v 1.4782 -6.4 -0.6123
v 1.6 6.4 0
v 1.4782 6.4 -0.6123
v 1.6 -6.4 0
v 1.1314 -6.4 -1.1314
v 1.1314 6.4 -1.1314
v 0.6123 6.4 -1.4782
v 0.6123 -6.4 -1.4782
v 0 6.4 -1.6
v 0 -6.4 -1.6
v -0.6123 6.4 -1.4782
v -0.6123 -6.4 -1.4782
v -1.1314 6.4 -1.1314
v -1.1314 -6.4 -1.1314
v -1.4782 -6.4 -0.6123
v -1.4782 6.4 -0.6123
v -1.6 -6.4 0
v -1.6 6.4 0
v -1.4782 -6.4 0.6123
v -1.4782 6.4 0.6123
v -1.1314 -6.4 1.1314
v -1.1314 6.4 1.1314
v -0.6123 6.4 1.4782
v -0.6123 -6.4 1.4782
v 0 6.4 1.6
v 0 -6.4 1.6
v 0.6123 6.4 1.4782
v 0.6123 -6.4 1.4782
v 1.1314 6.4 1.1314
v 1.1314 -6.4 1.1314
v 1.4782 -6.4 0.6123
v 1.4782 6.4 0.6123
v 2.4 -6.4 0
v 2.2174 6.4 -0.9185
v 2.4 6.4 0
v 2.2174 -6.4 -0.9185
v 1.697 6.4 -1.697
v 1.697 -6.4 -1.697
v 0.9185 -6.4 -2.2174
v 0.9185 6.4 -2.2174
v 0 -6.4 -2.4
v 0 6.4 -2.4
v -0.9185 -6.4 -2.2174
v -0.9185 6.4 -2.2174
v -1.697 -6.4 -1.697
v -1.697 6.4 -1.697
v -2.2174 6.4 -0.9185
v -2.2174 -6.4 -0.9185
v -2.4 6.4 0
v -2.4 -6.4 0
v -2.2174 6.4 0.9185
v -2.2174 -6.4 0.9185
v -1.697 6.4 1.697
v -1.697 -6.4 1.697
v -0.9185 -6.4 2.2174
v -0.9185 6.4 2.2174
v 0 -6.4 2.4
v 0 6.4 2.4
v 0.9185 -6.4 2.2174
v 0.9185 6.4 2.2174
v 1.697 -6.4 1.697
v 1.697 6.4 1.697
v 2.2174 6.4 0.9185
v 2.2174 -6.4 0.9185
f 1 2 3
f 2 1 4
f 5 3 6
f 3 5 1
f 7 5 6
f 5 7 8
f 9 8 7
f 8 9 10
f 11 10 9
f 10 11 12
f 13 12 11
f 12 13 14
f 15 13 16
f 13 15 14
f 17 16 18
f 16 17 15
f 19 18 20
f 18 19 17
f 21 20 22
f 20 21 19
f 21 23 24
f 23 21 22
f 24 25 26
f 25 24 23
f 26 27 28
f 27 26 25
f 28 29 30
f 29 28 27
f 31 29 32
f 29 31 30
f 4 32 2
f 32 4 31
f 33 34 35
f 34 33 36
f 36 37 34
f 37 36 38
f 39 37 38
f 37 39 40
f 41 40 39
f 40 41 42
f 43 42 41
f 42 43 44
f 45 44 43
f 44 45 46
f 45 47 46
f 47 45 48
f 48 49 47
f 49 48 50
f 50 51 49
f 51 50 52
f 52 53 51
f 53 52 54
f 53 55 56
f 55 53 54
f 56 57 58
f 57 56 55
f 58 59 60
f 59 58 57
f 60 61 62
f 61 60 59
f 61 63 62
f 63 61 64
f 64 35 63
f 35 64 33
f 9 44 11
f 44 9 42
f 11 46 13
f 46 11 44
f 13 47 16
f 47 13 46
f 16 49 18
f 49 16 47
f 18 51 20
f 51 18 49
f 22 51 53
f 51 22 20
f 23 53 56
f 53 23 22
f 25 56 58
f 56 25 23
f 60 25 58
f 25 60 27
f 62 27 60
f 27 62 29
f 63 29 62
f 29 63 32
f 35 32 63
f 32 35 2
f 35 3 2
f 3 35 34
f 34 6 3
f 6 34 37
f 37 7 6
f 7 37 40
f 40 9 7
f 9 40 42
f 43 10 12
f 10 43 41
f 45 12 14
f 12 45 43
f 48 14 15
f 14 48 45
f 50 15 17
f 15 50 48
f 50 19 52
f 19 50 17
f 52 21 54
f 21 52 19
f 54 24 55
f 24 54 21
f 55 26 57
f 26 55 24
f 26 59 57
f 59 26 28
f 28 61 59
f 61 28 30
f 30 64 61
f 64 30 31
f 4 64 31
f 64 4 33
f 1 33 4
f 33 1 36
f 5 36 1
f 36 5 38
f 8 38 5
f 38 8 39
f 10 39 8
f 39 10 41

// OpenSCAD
// file: ../p/4-4disc.scad
use <../lib.scad>
$fa=1; $fs=0.2;
function ldraw_lib__4_4disc(realsolid=false) = [
// 0 Disc 1.0
// 0 Name: 4-4disc.dat
// 0 Author: James Jessiman
// 0 !LDRAW_ORG Primitive UPDATE 2002-02
// 0 !LICENSE Licensed under CC BY 2.0 and CC BY 4.0 : see CAreadme.txt
// 
// 0 BFC CERTIFY CCW
  [0,"BFC","CERTIFY"],
  [0,"BFC","CCW"],
// 
// 0 !HISTORY 1998-12-15 [PTadmin] Official Update 1998-10
// 0 !HISTORY 2002-03-23 [sbliss] Added BFC statement
// 0 !HISTORY 2002-04-25 [PTadmin] Official Update 2002-02
// 0 !HISTORY 2007-06-24 [PTadmin] Header formatted for Contributor Agreement
// 0 !HISTORY 2008-07-01 [PTadmin] Official Update 2008-01
// 
// 
// 3 16 0 0 0 1 0 0 0.9239 0 0.3827
  [3,16,0,0,0,1,0,0,0.9239,0,0.3827],
// 3 16 0 0 0 0.9239 0 0.3827 0.7071 0 0.7071
  [3,16,0,0,0,0.9239,0,0.3827,0.7071,0,0.7071],
// 3 16 0 0 0 0.7071 0 0.7071 0.3827 0 0.9239
  [3,16,0,0,0,0.7071,0,0.7071,0.3827,0,0.9239],
// 3 16 0 0 0 0.3827 0 0.9239 0 0 1
  [3,16,0,0,0,0.3827,0,0.9239,0,0,1],
// 3 16 0 0 0 0 0 1 -0.3827 0 0.9239
  [3,16,0,0,0,0,0,1,-0.3827,0,0.9239],
// 3 16 0 0 0 -0.3827 0 0.9239 -0.7071 0 0.7071
  [3,16,0,0,0,-0.3827,0,0.9239,-0.7071,0,0.7071],
// 3 16 0 0 0 -0.7071 0 0.7071 -0.9239 0 0.3827
  [3,16,0,0,0,-0.7071,0,0.7071,-0.9239,0,0.3827],
// 3 16 0 0 0 -0.9239 0 0.3827 -1 0 -0
  [3,16,0,0,0,-0.9239,0,0.3827,-1,0,-0],
// 3 16 0 0 0 -1 0 -0 -0.9239 0 -0.3827
  [3,16,0,0,0,-1,0,-0,-0.9239,0,-0.3827],
// 3 16 0 0 0 -0.9239 0 -0.3827 -0.7071 0 -0.7071
  [3,16,0,0,0,-0.9239,0,-0.3827,-0.7071,0,-0.7071],
// 3 16 0 0 0 -0.7071 0 -0.7071 -0.3827 0 -0.9239
  [3,16,0,0,0,-0.7071,0,-0.7071,-0.3827,0,-0.9239],
// 3 16 0 0 0 -0.3827 0 -0.9239 0 0 -1
  [3,16,0,0,0,-0.3827,0,-0.9239,0,0,-1],
// 3 16 0 0 0 0 0 -1 0.3827 0 -0.9239
  [3,16,0,0,0,0,0,-1,0.3827,0,-0.9239],
// 3 16 0 0 0 0.3827 0 -0.9239 0.7071 0 -0.7071
  [3,16,0,0,0,0.3827,0,-0.9239,0.7071,0,-0.7071],
// 3 16 0 0 0 0.7071 0 -0.7071 0.9239 0 -0.3827
  [3,16,0,0,0,0.7071,0,-0.7071,0.9239,0,-0.3827],
// 3 16 0 0 0 0.9239 0 -0.3827 1 0 0
  [3,16,0,0,0,0.9239,0,-0.3827,1,0,0],
// 0
];
module ldraw_lib__4_4disc(step=0, col=false, unit=2/5, alt=false, line=0.2, solid=!$preview)
    makepoly(ldraw_lib__4_4disc(solid), step=step, col=col, unit=unit, alt=alt, line=line, solid=solid);
ldraw_lib__4_4disc(line=0.2);
// file: ../p/stud3.scad
use <../lib.scad>
use <4-4cyli.scad>
use <4-4disc.scad>
use <4-4edge.scad>
$fa=1; $fs=0.2;
function ldraw_lib__stud3(realsolid=false) = realsolid ? 
    [openscad(translate([0,0,-eps()], o=cylinder(4+eps(), r=4)),2)] : [
// 0 Stud Tube Solid
// 0 Name: stud3.dat
// 0 Author: James Jessiman
// 0 !LDRAW_ORG Primitive UPDATE 2012-01
// 0 !LICENSE Licensed under CC BY 2.0 and CC BY 4.0 : see CAreadme.txt
// 
// 0 BFC CERTIFY CCW
  [0,"BFC","CERTIFY"],
  [0,"BFC","CCW"],
// 
// 0 !HISTORY 2002-04-04 [sbliss] Modified for BFC compliance
// 0 !HISTORY 2002-04-25 [PTadmin] Official Update 2002-02
// 0 !HISTORY 2007-06-24 [PTadmin] Header formatted for Contributor Agreement
// 0 !HISTORY 2008-07-01 [PTadmin] Official Update 2008-01
// 0 !HISTORY 2012-02-16 [Philo] Changed to CCW
// 0 !HISTORY 2012-03-30 [PTadmin] Official Update 2012-01
// 
// 
// 1 16 0 -4 0 4 0 0 0 1 0 0 0 4 4-4edge.dat
  [1,16,0,-4,0,4,0,0,0,1,0,0,0,4, ldraw_lib__4_4edge(realsolid)],
// 1 16 0 0 0 4 0 0 0 1 0 0 0 4 4-4edge.dat
  [1,16,0,0,0,4,0,0,0,1,0,0,0,4, ldraw_lib__4_4edge(realsolid)],
// 1 16 0 -4 0 4 0 0 0 1 0 0 0 4 4-4disc.dat
  [1,16,0,-4,0,4,0,0,0,1,0,0,0,4, ldraw_lib__4_4disc(realsolid)],
// 1 16 0 -4 0 4 0 0 0 4 0 0 0 4 4-4cyli.dat
  [1,16,0,-4,0,4,0,0,0,4,0,0,0,4, ldraw_lib__4_4cyli(realsolid)],
];
module ldraw_lib__stud3(step=0, col=false, unit=2/5, alt=false, line=0.2, solid=!$preview)
    makepoly(ldraw_lib__stud3(solid), step=step, col=col, unit=unit, alt=alt, line=line, solid=solid);
ldraw_lib__stud3(line=0.2);
// file: ../p/stud.scad
use <../lib.scad>
use <4-4cyli.scad>
use <4-4disc.scad>
use <4-4edge.scad>
$fa=1; $fs=0.2;
function ldraw_lib__stud(realsolid=false) = realsolid ? 
    [openscad(translate([0,0,-eps()], o=cylinder(4+eps(), r=6)),2)] : [
// 0 Stud
// 0 Name: stud.dat
// 0 Author: James Jessiman
// 0 !LDRAW_ORG Primitive UPDATE 2012-01
// 0 !LICENSE Licensed under CC BY 2.0 and CC BY 4.0 : see CAreadme.txt
// 
// 0 BFC CERTIFY CCW
  [0,"BFC","CERTIFY"],
  [0,"BFC","CCW"],
// 
// 0 !HISTORY 2002-04-04 [sbliss] Modified for BFC compliance
// 0 !HISTORY 2002-04-25 [PTadmin] Official Update 2002-02
// 0 !HISTORY 2007-06-24 [PTadmin] Header formatted for Contributor Agreement
// 0 !HISTORY 2008-07-01 [PTadmin] Official Update 2008-01
// 0 !HISTORY 2012-02-16 [Philo] Changed to CCW
// 0 !HISTORY 2012-03-30 [PTadmin] Official Update 2012-01
// 
// 
// 1 16 0 0 0 6 0 0 0 1 0 0 0 6 4-4edge.dat
  [1,16,0,0,0,6,0,0,0,1,0,0,0,6, ldraw_lib__4_4edge(realsolid)],
// 1 16 0 -4 0 6 0 0 0 1 0 0 0 6 4-4edge.dat
  [1,16,0,-4,0,6,0,0,0,1,0,0,0,6, ldraw_lib__4_4edge(realsolid)],
// 1 16 0 0 0 6 0 0 0 -4 0 0 0 6 4-4cyli.dat
  [1,16,0,0,0,6,0,0,0,-4,0,0,0,6, ldraw_lib__4_4cyli(realsolid)],
// 1 16 0 -4 0 6 0 0 0 1 0 0 0 6 4-4disc.dat
  [1,16,0,-4,0,6,0,0,0,1,0,0,0,6, ldraw_lib__4_4disc(realsolid)],
];
module ldraw_lib__stud(step=0, col=false, unit=2/5, alt=false, line=0.2, solid=!$preview)
    makepoly(ldraw_lib__stud(solid), step=step, col=col, unit=unit, alt=alt, line=line, solid=solid);
ldraw_lib__stud(line=0.2);
// file: ../p/box5.scad
use <../lib.scad>
$fa=1; $fs=0.2;
function ldraw_lib__box5(realsolid=false) = [
// 0 Box with 5 Faces and All Edges
// 0 Name: box5.dat
// 0 Author: James Jessiman
// 0 !LDRAW_ORG Primitive UPDATE 2012-01
// 0 !LICENSE Licensed under CC BY 2.0 and CC BY 4.0 : see CAreadme.txt
// 
// 0 BFC CERTIFY CCW
  [0,"BFC","CERTIFY"],
  [0,"BFC","CCW"],
// 
// 0 !HISTORY 2002-04-03 [sbliss] Modified for BFC compliance
// 0 !HISTORY 2002-04-25 [PTadmin] Official Update 2002-02
// 0 !HISTORY 2007-06-24 [PTadmin] Header formatted for Contributor Agreement
// 0 !HISTORY 2008-07-01 [PTadmin] Official Update 2008-01
// 0 !HISTORY 2012-02-16 [Philo] Changed to CCW
// 0 !HISTORY 2012-03-30 [PTadmin] Official Update 2012-01
// 
// 
// 2 24 1 1 1 -1 1 1
  [2,24,1,1,1,-1,1,1],
// 2 24 -1 1 1 -1 1 -1
  [2,24,-1,1,1,-1,1,-1],
// 2 24 -1 1 -1 1 1 -1
  [2,24,-1,1,-1,1,1,-1],
// 2 24 1 1 -1 1 1 1
  [2,24,1,1,-1,1,1,1],
// 2 24 1 0 1 -1 0 1
  [2,24,1,0,1,-1,0,1],
// 2 24 -1 0 1 -1 0 -1
  [2,24,-1,0,1,-1,0,-1],
// 2 24 -1 0 -1 1 0 -1
  [2,24,-1,0,-1,1,0,-1],
// 2 24 1 0 -1 1 0 1
  [2,24,1,0,-1,1,0,1],
// 2 24 1 0 1 1 1 1
  [2,24,1,0,1,1,1,1],
// 2 24 -1 0 1 -1 1 1
  [2,24,-1,0,1,-1,1,1],
// 2 24 1 0 -1 1 1 -1
  [2,24,1,0,-1,1,1,-1],
// 2 24 -1 0 -1 -1 1 -1
  [2,24,-1,0,-1,-1,1,-1],
// 4 16 -1 1 1 1 1 1 1 1 -1 -1 1 -1
  [4,16,-1,1,1,1,1,1,1,1,-1,-1,1,-1],
// 4 16 -1 1 1 -1 0 1 1 0 1 1 1 1
  [4,16,-1,1,1,-1,0,1,1,0,1,1,1,1],
// 4 16 -1 1 -1 -1 0 -1 -1 0 1 -1 1 1
  [4,16,-1,1,-1,-1,0,-1,-1,0,1,-1,1,1],
// 4 16 1 1 -1 1 0 -1 -1 0 -1 -1 1 -1
  [4,16,1,1,-1,1,0,-1,-1,0,-1,-1,1,-1],
// 4 16 1 1 1 1 0 1 1 0 -1 1 1 -1
  [4,16,1,1,1,1,0,1,1,0,-1,1,1,-1],
];
module ldraw_lib__box5(step=0, col=false, unit=2/5, alt=false, line=0.2, solid=!$preview)
    makepoly(ldraw_lib__box5(solid), step=step, col=col, unit=unit, alt=alt, line=line, solid=solid);
ldraw_lib__box5(line=0.2);
// file: ../p/box4t.scad
use <../lib.scad>
$fa=1; $fs=0.2;
function ldraw_lib__box4t(realsolid=false) = [
// 0 Box with 4 Adjacent Faces and All Edges
// 0 Name: box4t.dat
// 0 Author: Tore Eriksson [Tore_Eriksson]
// 0 !LDRAW_ORG Primitive UPDATE 2003-02
// 0 !LICENSE Licensed under CC BY 2.0 and CC BY 4.0 : see CAreadme.txt
// 
// 0 BFC CERTIFY CCW
  [0,"BFC","CERTIFY"],
  [0,"BFC","CCW"],
// 
// 0 !HISTORY 1997-09-29 [PTadmin] Official Update 1997-15
// 0 !HISTORY 2002-08-31 [izanette] Modified with WINDZ for BFC compliance
// 0 !HISTORY 2003-08-01 [PTadmin] Official Update 2003-02
// 0 !HISTORY 2007-06-24 [PTadmin] Header formatted for Contributor Agreement
// 0 !HISTORY 2008-07-01 [PTadmin] Official Update 2008-01
// 
// 
// 2 24 1 1 1 -1 1 1
  [2,24,1,1,1,-1,1,1],
// 2 24 -1 1 1 -1 1 -1
  [2,24,-1,1,1,-1,1,-1],
// 2 24 -1 1 -1 1 1 -1
  [2,24,-1,1,-1,1,1,-1],
// 2 24 1 1 -1 1 1 1
  [2,24,1,1,-1,1,1,1],
// 2 24 1 0 1 -1 0 1
  [2,24,1,0,1,-1,0,1],
// 2 24 -1 0 1 -1 0 -1
  [2,24,-1,0,1,-1,0,-1],
// 2 24 -1 0 -1 1 0 -1
  [2,24,-1,0,-1,1,0,-1],
// 2 24 1 0 -1 1 0 1
  [2,24,1,0,-1,1,0,1],
// 2 24 1 0 1 1 1 1
  [2,24,1,0,1,1,1,1],
// 2 24 -1 0 1 -1 1 1
  [2,24,-1,0,1,-1,1,1],
// 2 24 1 0 -1 1 1 -1
  [2,24,1,0,-1,1,1,-1],
// 2 24 -1 0 -1 -1 1 -1
  [2,24,-1,0,-1,-1,1,-1],
// 4 16 1 1 1 1 1 -1 -1 1 -1 -1 1 1
  [4,16,1,1,1,1,1,-1,-1,1,-1,-1,1,1],
// 4 16 1 1 1 -1 1 1 -1 0 1 1 0 1
  [4,16,1,1,1,-1,1,1,-1,0,1,1,0,1],
// 4 16 -1 1 1 -1 1 -1 -1 0 -1 -1 0 1
  [4,16,-1,1,1,-1,1,-1,-1,0,-1,-1,0,1],
// 0 4 16 -1 1 -1 -1 0 -1 1 0 -1 1 1 -1
// 4 16 1 1 -1 1 1 1 1 0 1 1 0 -1
  [4,16,1,1,-1,1,1,1,1,0,1,1,0,-1],
// 0
];
module ldraw_lib__box4t(step=0, col=false, unit=2/5, alt=false, line=0.2, solid=!$preview)
    makepoly(ldraw_lib__box4t(solid), step=step, col=col, unit=unit, alt=alt, line=line, solid=solid);
ldraw_lib__box4t(line=0.2);
// file: s/3004s01.scad
use <../../lib.scad>
use <../../p/box4t.scad>
use <../../p/box5.scad>
use <../../p/stud.scad>
use <../../p/stud3.scad>
$fa=1; $fs=0.2;
function ldraw_lib__s__3004s01(realsolid=false) = [
// 0 ~Brick  1 x  2 without Front Face
// 0 Name: s\3004s01.dat
// 0 Author: James Jessiman
// 0 !LDRAW_ORG Subpart UPDATE 2003-03
// 0 !LICENSE Licensed under CC BY 2.0 and CC BY 4.0 : see CAreadme.txt
// 
// 0 BFC CERTIFY CCW
  [0,"BFC","CERTIFY"],
  [0,"BFC","CCW"],
// 
// 0 !HISTORY 2003-09-07 [jriley] Subfiling, BFC
// 0 !HISTORY 2003-12-19 [PTadmin] Official Update 2003-03
// 0 !HISTORY 2007-08-29 [PTadmin] Header formatted for Contributor Agreement
// 0 !HISTORY 2008-07-01 [PTadmin] Official Update 2008-01
// 
// 
// 1 16 0 4 0 1 0 0 0 -5 0 0 0 1 stud3.dat
  [1,16,0,4,0,1,0,0,0,-5,0,0,0,1, ldraw_lib__stud3(realsolid)],
// 0 BFC INVERTNEXT
  [0,"BFC","INVERTNEXT"],
// 1 16 0 24 0 16 0 0 0 -20 0 0 0 6 box5.dat
  [1,16,0,24,0,16,0,0,0,-20,0,0,0,6, ldraw_lib__box5(realsolid)],
// 4 16 20 24 10 16 24 6 -16 24 6 -20 24 10
  [4,16,20,24,10,16,24,6,-16,24,6,-20,24,10],
// 4 16 -20 24 10 -16 24 6 -16 24 -6 -20 24 -10
  [4,16,-20,24,10,-16,24,6,-16,24,-6,-20,24,-10],
// 4 16 -20 24 -10 -16 24 -6 16 24 -6 20 24 -10
  [4,16,-20,24,-10,-16,24,-6,16,24,-6,20,24,-10],
// 4 16 20 24 -10 16 24 -6 16 24 6 20 24 10
  [4,16,20,24,-10,16,24,-6,16,24,6,20,24,10],
// 1 16 0 24 0 20 0 0 0 -24 0 0 0 10 box4t.dat
  [1,16,0,24,0,20,0,0,0,-24,0,0,0,10, ldraw_lib__box4t(realsolid)],
// 1 16 10 0 0 1 0 0 0 1 0 0 0 1 stud.dat
  [1,16,10,0,0,1,0,0,0,1,0,0,0,1, ldraw_lib__stud(realsolid)],
// 1 16 -10 0 0 1 0 0 0 1 0 0 0 1 stud.dat
  [1,16,-10,0,0,1,0,0,0,1,0,0,0,1, ldraw_lib__stud(realsolid)],
// 0
];
module ldraw_lib__s__3004s01(step=0, col=false, unit=2/5, alt=false, line=0.2, solid=!$preview)
    makepoly(ldraw_lib__s__3004s01(solid), step=step, col=col, unit=unit, alt=alt, line=line, solid=solid);
ldraw_lib__s__3004s01(line=0.2);
// file: ../p/4-4ring2.scad
use <../lib.scad>
$fa=1; $fs=0.2;
function ldraw_lib__4_4ring2(realsolid=false) = [
// 0 Ring  2 x 1.0
// 0 Name: 4-4ring2.dat
// 0 Author: James Jessiman
// 0 !LDRAW_ORG Primitive UPDATE 2009-01
// 0 !LICENSE Licensed under CC BY 2.0 and CC BY 4.0 : see CAreadme.txt
// 
// 0 BFC CERTIFY CCW
  [0,"BFC","CERTIFY"],
  [0,"BFC","CCW"],
// 
// 0 !HISTORY 1998-12-15 [PTadmin] Official Update 1998-10
// 0 !HISTORY 2002-04-05 [hafhead] Added BFC statement
// 0 !HISTORY 2002-04-25 [PTadmin] Official Update 2002-02
// 0 !HISTORY 2007-06-24 [PTadmin] Header formatted for Contributor Agreement
// 0 !HISTORY 2008-07-01 [PTadmin] Official Update 2008-01
// 0 !HISTORY 2008-08-26 [cwdee] Switch polygon winding and rename
// 0 !HISTORY 2009-05-02 [PTadmin] Official Update 2009-01
// 
// 
// 4 16 -1.1481 0 2.7717 -0.7654 0 1.8478 0 0 2 0 0 3
  [4,16,-1.1481,0,2.7717,-0.7654,0,1.8478,0,0,2,0,0,3],
// 4 16 -2.1213 0 2.1213 -1.4142 0 1.4142 -0.7654 0 1.8478 -1.1481 0 2.7717
  [4,16,-2.1213,0,2.1213,-1.4142,0,1.4142,-0.7654,0,1.8478,-1.1481,0,2.7717],
// 4 16 -2.7717 0 1.1481 -1.8478 0 0.7654 -1.4142 0 1.4142 -2.1213 0 2.1213
  [4,16,-2.7717,0,1.1481,-1.8478,0,0.7654,-1.4142,0,1.4142,-2.1213,0,2.1213],
// 4 16 -3 0 0 -2 0 0 -1.8478 0 0.7654 -2.7717 0 1.1481
  [4,16,-3,0,0,-2,0,0,-1.8478,0,0.7654,-2.7717,0,1.1481],
// 4 16 -2.7717 0 -1.1481 -1.8478 0 -0.7654 -2 0 0 -3 0 0
  [4,16,-2.7717,0,-1.1481,-1.8478,0,-0.7654,-2,0,0,-3,0,0],
// 4 16 -2.1213 0 -2.1213 -1.4142 0 -1.4142 -1.8478 0 -0.7654 -2.7717 0 -1.1481
  [4,16,-2.1213,0,-2.1213,-1.4142,0,-1.4142,-1.8478,0,-0.7654,-2.7717,0,-1.1481],
// 4 16 -1.1481 0 -2.7717 -0.7654 0 -1.8478 -1.4142 0 -1.4142 -2.1213 0 -2.1213
  [4,16,-1.1481,0,-2.7717,-0.7654,0,-1.8478,-1.4142,0,-1.4142,-2.1213,0,-2.1213],
// 4 16 0 0 -3 0 0 -2 -0.7654 0 -1.8478 -1.1481 0 -2.7717
  [4,16,0,0,-3,0,0,-2,-0.7654,0,-1.8478,-1.1481,0,-2.7717],
// 4 16 1.1481 0 -2.7717 0.7654 0 -1.8478 0 0 -2 0 0 -3
  [4,16,1.1481,0,-2.7717,0.7654,0,-1.8478,0,0,-2,0,0,-3],
// 4 16 2.1213 0 -2.1213 1.4142 0 -1.4142 0.7654 0 -1.8478 1.1481 0 -2.7717
  [4,16,2.1213,0,-2.1213,1.4142,0,-1.4142,0.7654,0,-1.8478,1.1481,0,-2.7717],
// 4 16 2.7717 0 -1.1481 1.8478 0 -0.7654 1.4142 0 -1.4142 2.1213 0 -2.1213
  [4,16,2.7717,0,-1.1481,1.8478,0,-0.7654,1.4142,0,-1.4142,2.1213,0,-2.1213],
// 4 16 3 0 0 2 0 0 1.8478 0 -0.7654 2.7717 0 -1.1481
  [4,16,3,0,0,2,0,0,1.8478,0,-0.7654,2.7717,0,-1.1481],
// 4 16 2.7717 0 1.1481 1.8478 0 0.7654 2 0 0 3 0 0
  [4,16,2.7717,0,1.1481,1.8478,0,0.7654,2,0,0,3,0,0],
// 4 16 2.1213 0 2.1213 1.4142 0 1.4142 1.8478 0 0.7654 2.7717 0 1.1481
  [4,16,2.1213,0,2.1213,1.4142,0,1.4142,1.8478,0,0.7654,2.7717,0,1.1481],
// 4 16 1.1481 0 2.7717 0.7654 0 1.8478 1.4142 0 1.4142 2.1213 0 2.1213
  [4,16,1.1481,0,2.7717,0.7654,0,1.8478,1.4142,0,1.4142,2.1213,0,2.1213],
// 4 16 0 0 3 0 0 2 0.7654 0 1.8478 1.1481 0 2.7717
  [4,16,0,0,3,0,0,2,0.7654,0,1.8478,1.1481,0,2.7717],
// 0
];
module ldraw_lib__4_4ring2(step=0, col=false, unit=2/5, alt=false, line=0.2, solid=!$preview)
    makepoly(ldraw_lib__4_4ring2(solid), step=step, col=col, unit=unit, alt=alt, line=line, solid=solid);
ldraw_lib__4_4ring2(line=0.2);
// file: ../p/4-4edge.scad
use <../lib.scad>
$fa=1; $fs=0.2;
function ldraw_lib__4_4edge(realsolid=false) = [
// 0 Circle 1.0
// 0 Name: 4-4edge.dat
// 0 Author: James Jessiman
// 0 !LDRAW_ORG Primitive UPDATE 2017-01
// 0 !LICENSE Licensed under CC BY 2.0 and CC BY 4.0 : see CAreadme.txt
// 
// 0 BFC CERTIFY CCW
  [0,"BFC","CERTIFY"],
  [0,"BFC","CCW"],
// 
// 0 !HISTORY 1998-12-15 [PTadmin] Official Update 1998-10
// 0 !HISTORY 2005-12-28 [PTadmin] Official Update 2005-01
// 0 !HISTORY 2007-06-24 [PTadmin] Header formatted for Contributor Agreement
// 0 !HISTORY 2008-07-01 [PTadmin] Official Update 2008-01
// 0 !HISTORY 2017-01-15 [Steffen] BFCed
// 0 !HISTORY 2017-12-30 [PTadmin] Official Update 2017-01
// 
// 
// 2 24 1 0 0 0.9239 0 0.3827
  [2,24,1,0,0,0.9239,0,0.3827],
// 2 24 0.9239 0 0.3827 0.7071 0 0.7071
  [2,24,0.9239,0,0.3827,0.7071,0,0.7071],
// 2 24 0.7071 0 0.7071 0.3827 0 0.9239
  [2,24,0.7071,0,0.7071,0.3827,0,0.9239],
// 2 24 0.3827 0 0.9239 0 0 1
  [2,24,0.3827,0,0.9239,0,0,1],
// 2 24 0 0 1 -0.3827 0 0.9239
  [2,24,0,0,1,-0.3827,0,0.9239],
// 2 24 -0.3827 0 0.9239 -0.7071 0 0.7071
  [2,24,-0.3827,0,0.9239,-0.7071,0,0.7071],
// 2 24 -0.7071 0 0.7071 -0.9239 0 0.3827
  [2,24,-0.7071,0,0.7071,-0.9239,0,0.3827],
// 2 24 -0.9239 0 0.3827 -1 0 -0
  [2,24,-0.9239,0,0.3827,-1,0,-0],
// 2 24 -1 0 -0 -0.9239 0 -0.3827
  [2,24,-1,0,-0,-0.9239,0,-0.3827],
// 2 24 -0.9239 0 -0.3827 -0.7071 0 -0.7071
  [2,24,-0.9239,0,-0.3827,-0.7071,0,-0.7071],
// 2 24 -0.7071 0 -0.7071 -0.3827 0 -0.9239
  [2,24,-0.7071,0,-0.7071,-0.3827,0,-0.9239],
// 2 24 -0.3827 0 -0.9239 0 0 -1
  [2,24,-0.3827,0,-0.9239,0,0,-1],
// 2 24 0 0 -1 0.3827 0 -0.9239
  [2,24,0,0,-1,0.3827,0,-0.9239],
// 2 24 0.3827 0 -0.9239 0.7071 0 -0.7071
  [2,24,0.3827,0,-0.9239,0.7071,0,-0.7071],
// 2 24 0.7071 0 -0.7071 0.9239 0 -0.3827
  [2,24,0.7071,0,-0.7071,0.9239,0,-0.3827],
// 2 24 0.9239 0 -0.3827 1 0 0
  [2,24,0.9239,0,-0.3827,1,0,0],
];
module ldraw_lib__4_4edge(step=0, col=false, unit=2/5, alt=false, line=0.2, solid=!$preview)
    makepoly(ldraw_lib__4_4edge(solid), step=step, col=col, unit=unit, alt=alt, line=line, solid=solid);
ldraw_lib__4_4edge(line=0.2);
// file: ../p/4-4cyli.scad
use <../lib.scad>
$fa=1; $fs=0.2;
function ldraw_lib__4_4cyli(realsolid=false) = [
// 0 Cylinder 1.0
// 0 Name: 4-4cyli.dat
// 0 Author: James Jessiman
// 0 !LDRAW_ORG Primitive UPDATE 2005-01
// 0 !LICENSE Licensed under CC BY 2.0 and CC BY 4.0 : see CAreadme.txt
// 
// 0 BFC CERTIFY CCW
  [0,"BFC","CERTIFY"],
  [0,"BFC","CCW"],
// 
// 0 !HISTORY 1998-12-15 [PTadmin] Official Update 1998-10
// 0 !HISTORY 2002-03-23 [sbliss] Added BFC statement; merged headers from files in distributions LDraw 0.27 and Complete.
// 0 !HISTORY 2002-04-25 [PTadmin] Official Update 2002-02
// 0 !HISTORY 2004-12-14 [guyvivan] BFC CCW
// 0 !HISTORY 2005-12-28 [PTadmin] Official Update 2005-01
// 0 !HISTORY 2007-06-24 [PTadmin] Header formatted for Contributor Agreement
// 0 !HISTORY 2008-07-01 [PTadmin] Official Update 2008-01
// 
// 
// 4 16 1 1 0 0.9239 1 0.3827 0.9239 0 0.3827 1 0 0
  [4,16,1,1,0,0.9239,1,0.3827,0.9239,0,0.3827,1,0,0],
// 5 24 1 0 0 1 1 0 0.9239 0 0.3827 0.9239 0 -0.3827
  [5,24,1,0,0,1,1,0,0.9239,0,0.3827,0.9239,0,-0.3827],
// 4 16 0.9239 1 0.3827 0.7071 1 0.7071 0.7071 0 0.7071 0.9239 0 0.3827
  [4,16,0.9239,1,0.3827,0.7071,1,0.7071,0.7071,0,0.7071,0.9239,0,0.3827],
// 5 24 0.9239 0 0.3827 0.9239 1 0.3827 0.7071 0 0.7071 1 0 0
  [5,24,0.9239,0,0.3827,0.9239,1,0.3827,0.7071,0,0.7071,1,0,0],
// 4 16 0.7071 1 0.7071 0.3827 1 0.9239 0.3827 0 0.9239 0.7071 0 0.7071
  [4,16,0.7071,1,0.7071,0.3827,1,0.9239,0.3827,0,0.9239,0.7071,0,0.7071],
// 5 24 0.7071 0 0.7071 0.7071 1 0.7071 0.3827 0 0.9239 0.9239 0 0.3827
  [5,24,0.7071,0,0.7071,0.7071,1,0.7071,0.3827,0,0.9239,0.9239,0,0.3827],
// 4 16 0.3827 1 0.9239 0 1 1 0 0 1 0.3827 0 0.9239
  [4,16,0.3827,1,0.9239,0,1,1,0,0,1,0.3827,0,0.9239],
// 5 24 0.3827 0 0.9239 0.3827 1 0.9239 0 0 1 0.7071 0 0.7071
  [5,24,0.3827,0,0.9239,0.3827,1,0.9239,0,0,1,0.7071,0,0.7071],
// 4 16 0 1 1 -0.3827 1 0.9239 -0.3827 0 0.9239 0 0 1
  [4,16,0,1,1,-0.3827,1,0.9239,-0.3827,0,0.9239,0,0,1],
// 5 24 0 0 1 0 1 1 -0.3827 0 0.9239 0.3827 0 0.9239
  [5,24,0,0,1,0,1,1,-0.3827,0,0.9239,0.3827,0,0.9239],
// 4 16 -0.3827 1 0.9239 -0.7071 1 0.7071 -0.7071 0 0.7071 -0.3827 0 0.9239
  [4,16,-0.3827,1,0.9239,-0.7071,1,0.7071,-0.7071,0,0.7071,-0.3827,0,0.9239],
// 5 24 -0.3827 0 0.9239 -0.3827 1 0.9239 -0.7071 0 0.7071 0 0 1
  [5,24,-0.3827,0,0.9239,-0.3827,1,0.9239,-0.7071,0,0.7071,0,0,1],
// 4 16 -0.7071 1 0.7071 -0.9239 1 0.3827 -0.9239 0 0.3827 -0.7071 0 0.7071
  [4,16,-0.7071,1,0.7071,-0.9239,1,0.3827,-0.9239,0,0.3827,-0.7071,0,0.7071],
// 5 24 -0.7071 0 0.7071 -0.7071 1 0.7071 -0.9239 0 0.3827 -0.3827 0 0.9239
  [5,24,-0.7071,0,0.7071,-0.7071,1,0.7071,-0.9239,0,0.3827,-0.3827,0,0.9239],
// 4 16 -0.9239 1 0.3827 -1 1 0 -1 0 0 -0.9239 0 0.3827
  [4,16,-0.9239,1,0.3827,-1,1,0,-1,0,0,-0.9239,0,0.3827],
// 5 24 -0.9239 0 0.3827 -0.9239 1 0.3827 -1 0 0 -0.7071 0 0.7071
  [5,24,-0.9239,0,0.3827,-0.9239,1,0.3827,-1,0,0,-0.7071,0,0.7071],
// 4 16 -1 1 0 -0.9239 1 -0.3827 -0.9239 0 -0.3827 -1 0 0
  [4,16,-1,1,0,-0.9239,1,-0.3827,-0.9239,0,-0.3827,-1,0,0],
// 5 24 -1 0 0 -1 1 0 -0.9239 0 -0.3827 -0.9239 0 0.3827
  [5,24,-1,0,0,-1,1,0,-0.9239,0,-0.3827,-0.9239,0,0.3827],
// 4 16 -0.9239 1 -0.3827 -0.7071 1 -0.7071 -0.7071 0 -0.7071 -0.9239 0 -0.3827
  [4,16,-0.9239,1,-0.3827,-0.7071,1,-0.7071,-0.7071,0,-0.7071,-0.9239,0,-0.3827],
// 5 24 -0.9239 0 -0.3827 -0.9239 1 -0.3827 -0.7071 0 -0.7071 -1 0 0
  [5,24,-0.9239,0,-0.3827,-0.9239,1,-0.3827,-0.7071,0,-0.7071,-1,0,0],
// 4 16 -0.7071 1 -0.7071 -0.3827 1 -0.9239 -0.3827 0 -0.9239 -0.7071 0 -0.7071
  [4,16,-0.7071,1,-0.7071,-0.3827,1,-0.9239,-0.3827,0,-0.9239,-0.7071,0,-0.7071],
// 5 24 -0.7071 0 -0.7071 -0.7071 1 -0.7071 -0.3827 0 -0.9239 -0.9239 0 -0.3827
  [5,24,-0.7071,0,-0.7071,-0.7071,1,-0.7071,-0.3827,0,-0.9239,-0.9239,0,-0.3827],
// 4 16 -0.3827 1 -0.9239 0 1 -1 0 0 -1 -0.3827 0 -0.9239
  [4,16,-0.3827,1,-0.9239,0,1,-1,0,0,-1,-0.3827,0,-0.9239],
// 5 24 -0.3827 0 -0.9239 -0.3827 1 -0.9239 0 0 -1 -0.7071 0 -0.7071
  [5,24,-0.3827,0,-0.9239,-0.3827,1,-0.9239,0,0,-1,-0.7071,0,-0.7071],
// 4 16 0 1 -1 0.3827 1 -0.9239 0.3827 0 -0.9239 0 0 -1
  [4,16,0,1,-1,0.3827,1,-0.9239,0.3827,0,-0.9239,0,0,-1],
// 5 24 0 0 -1 0 1 -1 0.3827 0 -0.9239 -0.3827 0 -0.9239
  [5,24,0,0,-1,0,1,-1,0.3827,0,-0.9239,-0.3827,0,-0.9239],
// 4 16 0.3827 1 -0.9239 0.7071 1 -0.7071 0.7071 0 -0.7071 0.3827 0 -0.9239
  [4,16,0.3827,1,-0.9239,0.7071,1,-0.7071,0.7071,0,-0.7071,0.3827,0,-0.9239],
// 5 24 0.3827 0 -0.9239 0.3827 1 -0.9239 0.7071 0 -0.7071 0 0 -1
  [5,24,0.3827,0,-0.9239,0.3827,1,-0.9239,0.7071,0,-0.7071,0,0,-1],
// 4 16 0.7071 1 -0.7071 0.9239 1 -0.3827 0.9239 0 -0.3827 0.7071 0 -0.7071
  [4,16,0.7071,1,-0.7071,0.9239,1,-0.3827,0.9239,0,-0.3827,0.7071,0,-0.7071],
// 5 24 0.7071 0 -0.7071 0.7071 1 -0.7071 0.9239 0 -0.3827 0.3827 0 -0.9239
  [5,24,0.7071,0,-0.7071,0.7071,1,-0.7071,0.9239,0,-0.3827,0.3827,0,-0.9239],
// 4 16 0.9239 1 -0.3827 1 1 0 1 0 0 0.9239 0 -0.3827
  [4,16,0.9239,1,-0.3827,1,1,0,1,0,0,0.9239,0,-0.3827],
// 5 24 0.9239 0 -0.3827 0.9239 1 -0.3827 1 0 0 0.7071 0 -0.7071
  [5,24,0.9239,0,-0.3827,0.9239,1,-0.3827,1,0,0,0.7071,0,-0.7071],
// 0
];
module ldraw_lib__4_4cyli(step=0, col=false, unit=2/5, alt=false, line=0.2, solid=!$preview)
    makepoly(ldraw_lib__4_4cyli(solid), step=step, col=col, unit=unit, alt=alt, line=line, solid=solid);
ldraw_lib__4_4cyli(line=0.2);
// file: 3004.scad
use <../lib.scad>
use <s/3004s01.scad>
$fa=1; $fs=0.2;
function ldraw_lib__3004(realsolid=false) = [
// 0 Brick  1 x  2
// 0 Name: 3004.dat
// 0 Author: James Jessiman
// 0 !LDRAW_ORG Part UPDATE 2022-05
// 0 !LICENSE Licensed under CC BY 2.0 and CC BY 4.0 : see CAreadme.txt
// 
// 0 BFC CERTIFY CCW
  [0,"BFC","CERTIFY"],
  [0,"BFC","CCW"],
// 
// 0 !HISTORY 2001-10-26 [PTadmin] Official Update 2001-01
// 0 !HISTORY 2002-05-07 {unknown} BFC Certification
// 0 !HISTORY 2002-06-11 [PTadmin] Official Update 2002-03
// 0 !HISTORY 2007-05-07 [PTadmin] Header formatted for Contributor Agreement
// 0 !HISTORY 2008-07-01 [PTadmin] Official Update 2008-01
// 0 !HISTORY 2022-08-04 [MagFors] Using subfile
// 0 !HISTORY 2022-09-15 [PTadmin] Official Update 2022-05
// 
// 
// 1 16 0 0 0 1 0 0 0 1 0 0 0 1 s\3004s01.dat
  [1,16,0,0,0,1,0,0,0,1,0,0,0,1, ldraw_lib__s__3004s01(realsolid)],
// 4 16 -20 24 -10 20 24 -10 20 0 -10 -20 0 -10
  [4,16,-20,24,-10,20,24,-10,20,0,-10,-20,0,-10],
];
module ldraw_lib__3004(step=0, col=false, unit=2/5, alt=false, line=0.2, solid=!$preview)
    makepoly(ldraw_lib__3004(solid), step=step, col=col, unit=unit, alt=alt, line=line, solid=solid);
ldraw_lib__3004(line=0.2);
// file: 3112.scad
use <../lib.scad>
use <../p/4-4cyli.scad>
use <../p/4-4edge.scad>
use <../p/4-4ring2.scad>
$fa=1; $fs=0.2;
function ldraw_lib__3112(realsolid=false) = [
// 0 ~Axle Bush 1.6L
// 0 Name: 3112.dat
// 0 Author: James Jessiman
// 0 !LDRAW_ORG Part UPDATE 2018-02
// 0 !LICENSE Licensed under CC BY 2.0 and CC BY 4.0 : see CAreadme.txt
// 
// 0 BFC CERTIFY CW
  [0,"BFC","CERTIFY"],
  [0,"BFC","CW"],
// 
// 0 !CATEGORY Wheel
// 
// 0 !HISTORY 2007-06-25 [PTadmin] Header formatted for Contributor Agreement
// 0 !HISTORY 2008-07-01 [PTadmin] Official Update 2008-01
// 0 !HISTORY 2008-07-07 [mkennedy] Completed header, BFC'ed, Optimized
// 0 !HISTORY 2008-08-23 [PTadmin] Renamed from 34c
// 0 !HISTORY 2009-05-02 [PTadmin] Official Update 2009-01
// 0 !HISTORY 2018-11-24 [cwdee] Update description
// 0 !HISTORY 2018-12-08 [PTadmin] Official Update 2018-02
// 
// 
// 0 BFC INVERTNEXT
  [0,"BFC","INVERTNEXT"],
// 1 16 0 0 -16 4 0 0 0 0 4 0 32 0 4-4cyli.dat
  [1,16,0,0,-16,4,0,0,0,0,4,0,32,0, ldraw_lib__4_4cyli(realsolid)],
// 1 16 0 0 -16 6 0 0 0 0 6 0 32 0 4-4cyli.dat
  [1,16,0,0,-16,6,0,0,0,0,6,0,32,0, ldraw_lib__4_4cyli(realsolid)],
// 1 16 0 0 -16 4 0 0 0 0 4 0 1 0 4-4edge.dat
  [1,16,0,0,-16,4,0,0,0,0,4,0,1,0, ldraw_lib__4_4edge(realsolid)],
// 1 16 0 0 16 4 0 0 0 0 4 0 1 0 4-4edge.dat
  [1,16,0,0,16,4,0,0,0,0,4,0,1,0, ldraw_lib__4_4edge(realsolid)],
// 1 16 0 0 -16 6 0 0 0 0 6 0 1 0 4-4edge.dat
  [1,16,0,0,-16,6,0,0,0,0,6,0,1,0, ldraw_lib__4_4edge(realsolid)],
// 1 16 0 0 16 6 0 0 0 0 6 0 1 0 4-4edge.dat
  [1,16,0,0,16,6,0,0,0,0,6,0,1,0, ldraw_lib__4_4edge(realsolid)],
// 1 16 0 0 16 2 0 0 0 0 2 0 -1 0 4-4ring2.dat
  [1,16,0,0,16,2,0,0,0,0,2,0,-1,0, ldraw_lib__4_4ring2(realsolid)],
// 1 16 0 0 -16 2 0 0 0 0 2 0 1 0 4-4ring2.dat
  [1,16,0,0,-16,2,0,0,0,0,2,0,1,0, ldraw_lib__4_4ring2(realsolid)],
// 0
// 
];
module ldraw_lib__3112(step=0, col=false, unit=2/5, alt=false, line=0.2, solid=!$preview)
    makepoly(ldraw_lib__3112(solid), step=step, col=col, unit=unit, alt=alt, line=line, solid=solid);
ldraw_lib__3112(line=0.2);
// main file
use <../lib.scad>
use <3112.scad>
$fa=1; $fs=0.2;
function ldraw_lib__34c(realsolid=false) = [
// 0 ~Moved to 3112
// 0 Name: 34c.dat
// 0 Author: [PTadmin]
// 0 !LDRAW_ORG Part UPDATE 2009-01
// 0 !LICENSE Licensed under CC BY 4.0 : see CAreadme.txt
// 
// 0 BFC CERTIFY CCW
  [0,"BFC","CERTIFY"],
  [0,"BFC","CCW"],
// 
// 0 !HISTORY 2009-05-02 [PTadmin] Official Update 2009-01
// 
// 
// 0 // ~Brick 2 x 4 with Wheels Holder Shaft
// 1 16 0 0 0 1 0 0 0 1 0 0 0 1 3112.dat
  [1,16,0,0,0,1,0,0,0,1,0,0,0,1, ldraw_lib__3112(realsolid)],
];
module ldraw_lib__34c(step=0, col=false, unit=2/5, alt=false, line=0.2, solid=!$preview)
    makepoly(ldraw_lib__34c(solid), step=step, col=col, unit=unit, alt=alt, line=line, solid=solid);
ldraw_lib__34c(line=0.2);
